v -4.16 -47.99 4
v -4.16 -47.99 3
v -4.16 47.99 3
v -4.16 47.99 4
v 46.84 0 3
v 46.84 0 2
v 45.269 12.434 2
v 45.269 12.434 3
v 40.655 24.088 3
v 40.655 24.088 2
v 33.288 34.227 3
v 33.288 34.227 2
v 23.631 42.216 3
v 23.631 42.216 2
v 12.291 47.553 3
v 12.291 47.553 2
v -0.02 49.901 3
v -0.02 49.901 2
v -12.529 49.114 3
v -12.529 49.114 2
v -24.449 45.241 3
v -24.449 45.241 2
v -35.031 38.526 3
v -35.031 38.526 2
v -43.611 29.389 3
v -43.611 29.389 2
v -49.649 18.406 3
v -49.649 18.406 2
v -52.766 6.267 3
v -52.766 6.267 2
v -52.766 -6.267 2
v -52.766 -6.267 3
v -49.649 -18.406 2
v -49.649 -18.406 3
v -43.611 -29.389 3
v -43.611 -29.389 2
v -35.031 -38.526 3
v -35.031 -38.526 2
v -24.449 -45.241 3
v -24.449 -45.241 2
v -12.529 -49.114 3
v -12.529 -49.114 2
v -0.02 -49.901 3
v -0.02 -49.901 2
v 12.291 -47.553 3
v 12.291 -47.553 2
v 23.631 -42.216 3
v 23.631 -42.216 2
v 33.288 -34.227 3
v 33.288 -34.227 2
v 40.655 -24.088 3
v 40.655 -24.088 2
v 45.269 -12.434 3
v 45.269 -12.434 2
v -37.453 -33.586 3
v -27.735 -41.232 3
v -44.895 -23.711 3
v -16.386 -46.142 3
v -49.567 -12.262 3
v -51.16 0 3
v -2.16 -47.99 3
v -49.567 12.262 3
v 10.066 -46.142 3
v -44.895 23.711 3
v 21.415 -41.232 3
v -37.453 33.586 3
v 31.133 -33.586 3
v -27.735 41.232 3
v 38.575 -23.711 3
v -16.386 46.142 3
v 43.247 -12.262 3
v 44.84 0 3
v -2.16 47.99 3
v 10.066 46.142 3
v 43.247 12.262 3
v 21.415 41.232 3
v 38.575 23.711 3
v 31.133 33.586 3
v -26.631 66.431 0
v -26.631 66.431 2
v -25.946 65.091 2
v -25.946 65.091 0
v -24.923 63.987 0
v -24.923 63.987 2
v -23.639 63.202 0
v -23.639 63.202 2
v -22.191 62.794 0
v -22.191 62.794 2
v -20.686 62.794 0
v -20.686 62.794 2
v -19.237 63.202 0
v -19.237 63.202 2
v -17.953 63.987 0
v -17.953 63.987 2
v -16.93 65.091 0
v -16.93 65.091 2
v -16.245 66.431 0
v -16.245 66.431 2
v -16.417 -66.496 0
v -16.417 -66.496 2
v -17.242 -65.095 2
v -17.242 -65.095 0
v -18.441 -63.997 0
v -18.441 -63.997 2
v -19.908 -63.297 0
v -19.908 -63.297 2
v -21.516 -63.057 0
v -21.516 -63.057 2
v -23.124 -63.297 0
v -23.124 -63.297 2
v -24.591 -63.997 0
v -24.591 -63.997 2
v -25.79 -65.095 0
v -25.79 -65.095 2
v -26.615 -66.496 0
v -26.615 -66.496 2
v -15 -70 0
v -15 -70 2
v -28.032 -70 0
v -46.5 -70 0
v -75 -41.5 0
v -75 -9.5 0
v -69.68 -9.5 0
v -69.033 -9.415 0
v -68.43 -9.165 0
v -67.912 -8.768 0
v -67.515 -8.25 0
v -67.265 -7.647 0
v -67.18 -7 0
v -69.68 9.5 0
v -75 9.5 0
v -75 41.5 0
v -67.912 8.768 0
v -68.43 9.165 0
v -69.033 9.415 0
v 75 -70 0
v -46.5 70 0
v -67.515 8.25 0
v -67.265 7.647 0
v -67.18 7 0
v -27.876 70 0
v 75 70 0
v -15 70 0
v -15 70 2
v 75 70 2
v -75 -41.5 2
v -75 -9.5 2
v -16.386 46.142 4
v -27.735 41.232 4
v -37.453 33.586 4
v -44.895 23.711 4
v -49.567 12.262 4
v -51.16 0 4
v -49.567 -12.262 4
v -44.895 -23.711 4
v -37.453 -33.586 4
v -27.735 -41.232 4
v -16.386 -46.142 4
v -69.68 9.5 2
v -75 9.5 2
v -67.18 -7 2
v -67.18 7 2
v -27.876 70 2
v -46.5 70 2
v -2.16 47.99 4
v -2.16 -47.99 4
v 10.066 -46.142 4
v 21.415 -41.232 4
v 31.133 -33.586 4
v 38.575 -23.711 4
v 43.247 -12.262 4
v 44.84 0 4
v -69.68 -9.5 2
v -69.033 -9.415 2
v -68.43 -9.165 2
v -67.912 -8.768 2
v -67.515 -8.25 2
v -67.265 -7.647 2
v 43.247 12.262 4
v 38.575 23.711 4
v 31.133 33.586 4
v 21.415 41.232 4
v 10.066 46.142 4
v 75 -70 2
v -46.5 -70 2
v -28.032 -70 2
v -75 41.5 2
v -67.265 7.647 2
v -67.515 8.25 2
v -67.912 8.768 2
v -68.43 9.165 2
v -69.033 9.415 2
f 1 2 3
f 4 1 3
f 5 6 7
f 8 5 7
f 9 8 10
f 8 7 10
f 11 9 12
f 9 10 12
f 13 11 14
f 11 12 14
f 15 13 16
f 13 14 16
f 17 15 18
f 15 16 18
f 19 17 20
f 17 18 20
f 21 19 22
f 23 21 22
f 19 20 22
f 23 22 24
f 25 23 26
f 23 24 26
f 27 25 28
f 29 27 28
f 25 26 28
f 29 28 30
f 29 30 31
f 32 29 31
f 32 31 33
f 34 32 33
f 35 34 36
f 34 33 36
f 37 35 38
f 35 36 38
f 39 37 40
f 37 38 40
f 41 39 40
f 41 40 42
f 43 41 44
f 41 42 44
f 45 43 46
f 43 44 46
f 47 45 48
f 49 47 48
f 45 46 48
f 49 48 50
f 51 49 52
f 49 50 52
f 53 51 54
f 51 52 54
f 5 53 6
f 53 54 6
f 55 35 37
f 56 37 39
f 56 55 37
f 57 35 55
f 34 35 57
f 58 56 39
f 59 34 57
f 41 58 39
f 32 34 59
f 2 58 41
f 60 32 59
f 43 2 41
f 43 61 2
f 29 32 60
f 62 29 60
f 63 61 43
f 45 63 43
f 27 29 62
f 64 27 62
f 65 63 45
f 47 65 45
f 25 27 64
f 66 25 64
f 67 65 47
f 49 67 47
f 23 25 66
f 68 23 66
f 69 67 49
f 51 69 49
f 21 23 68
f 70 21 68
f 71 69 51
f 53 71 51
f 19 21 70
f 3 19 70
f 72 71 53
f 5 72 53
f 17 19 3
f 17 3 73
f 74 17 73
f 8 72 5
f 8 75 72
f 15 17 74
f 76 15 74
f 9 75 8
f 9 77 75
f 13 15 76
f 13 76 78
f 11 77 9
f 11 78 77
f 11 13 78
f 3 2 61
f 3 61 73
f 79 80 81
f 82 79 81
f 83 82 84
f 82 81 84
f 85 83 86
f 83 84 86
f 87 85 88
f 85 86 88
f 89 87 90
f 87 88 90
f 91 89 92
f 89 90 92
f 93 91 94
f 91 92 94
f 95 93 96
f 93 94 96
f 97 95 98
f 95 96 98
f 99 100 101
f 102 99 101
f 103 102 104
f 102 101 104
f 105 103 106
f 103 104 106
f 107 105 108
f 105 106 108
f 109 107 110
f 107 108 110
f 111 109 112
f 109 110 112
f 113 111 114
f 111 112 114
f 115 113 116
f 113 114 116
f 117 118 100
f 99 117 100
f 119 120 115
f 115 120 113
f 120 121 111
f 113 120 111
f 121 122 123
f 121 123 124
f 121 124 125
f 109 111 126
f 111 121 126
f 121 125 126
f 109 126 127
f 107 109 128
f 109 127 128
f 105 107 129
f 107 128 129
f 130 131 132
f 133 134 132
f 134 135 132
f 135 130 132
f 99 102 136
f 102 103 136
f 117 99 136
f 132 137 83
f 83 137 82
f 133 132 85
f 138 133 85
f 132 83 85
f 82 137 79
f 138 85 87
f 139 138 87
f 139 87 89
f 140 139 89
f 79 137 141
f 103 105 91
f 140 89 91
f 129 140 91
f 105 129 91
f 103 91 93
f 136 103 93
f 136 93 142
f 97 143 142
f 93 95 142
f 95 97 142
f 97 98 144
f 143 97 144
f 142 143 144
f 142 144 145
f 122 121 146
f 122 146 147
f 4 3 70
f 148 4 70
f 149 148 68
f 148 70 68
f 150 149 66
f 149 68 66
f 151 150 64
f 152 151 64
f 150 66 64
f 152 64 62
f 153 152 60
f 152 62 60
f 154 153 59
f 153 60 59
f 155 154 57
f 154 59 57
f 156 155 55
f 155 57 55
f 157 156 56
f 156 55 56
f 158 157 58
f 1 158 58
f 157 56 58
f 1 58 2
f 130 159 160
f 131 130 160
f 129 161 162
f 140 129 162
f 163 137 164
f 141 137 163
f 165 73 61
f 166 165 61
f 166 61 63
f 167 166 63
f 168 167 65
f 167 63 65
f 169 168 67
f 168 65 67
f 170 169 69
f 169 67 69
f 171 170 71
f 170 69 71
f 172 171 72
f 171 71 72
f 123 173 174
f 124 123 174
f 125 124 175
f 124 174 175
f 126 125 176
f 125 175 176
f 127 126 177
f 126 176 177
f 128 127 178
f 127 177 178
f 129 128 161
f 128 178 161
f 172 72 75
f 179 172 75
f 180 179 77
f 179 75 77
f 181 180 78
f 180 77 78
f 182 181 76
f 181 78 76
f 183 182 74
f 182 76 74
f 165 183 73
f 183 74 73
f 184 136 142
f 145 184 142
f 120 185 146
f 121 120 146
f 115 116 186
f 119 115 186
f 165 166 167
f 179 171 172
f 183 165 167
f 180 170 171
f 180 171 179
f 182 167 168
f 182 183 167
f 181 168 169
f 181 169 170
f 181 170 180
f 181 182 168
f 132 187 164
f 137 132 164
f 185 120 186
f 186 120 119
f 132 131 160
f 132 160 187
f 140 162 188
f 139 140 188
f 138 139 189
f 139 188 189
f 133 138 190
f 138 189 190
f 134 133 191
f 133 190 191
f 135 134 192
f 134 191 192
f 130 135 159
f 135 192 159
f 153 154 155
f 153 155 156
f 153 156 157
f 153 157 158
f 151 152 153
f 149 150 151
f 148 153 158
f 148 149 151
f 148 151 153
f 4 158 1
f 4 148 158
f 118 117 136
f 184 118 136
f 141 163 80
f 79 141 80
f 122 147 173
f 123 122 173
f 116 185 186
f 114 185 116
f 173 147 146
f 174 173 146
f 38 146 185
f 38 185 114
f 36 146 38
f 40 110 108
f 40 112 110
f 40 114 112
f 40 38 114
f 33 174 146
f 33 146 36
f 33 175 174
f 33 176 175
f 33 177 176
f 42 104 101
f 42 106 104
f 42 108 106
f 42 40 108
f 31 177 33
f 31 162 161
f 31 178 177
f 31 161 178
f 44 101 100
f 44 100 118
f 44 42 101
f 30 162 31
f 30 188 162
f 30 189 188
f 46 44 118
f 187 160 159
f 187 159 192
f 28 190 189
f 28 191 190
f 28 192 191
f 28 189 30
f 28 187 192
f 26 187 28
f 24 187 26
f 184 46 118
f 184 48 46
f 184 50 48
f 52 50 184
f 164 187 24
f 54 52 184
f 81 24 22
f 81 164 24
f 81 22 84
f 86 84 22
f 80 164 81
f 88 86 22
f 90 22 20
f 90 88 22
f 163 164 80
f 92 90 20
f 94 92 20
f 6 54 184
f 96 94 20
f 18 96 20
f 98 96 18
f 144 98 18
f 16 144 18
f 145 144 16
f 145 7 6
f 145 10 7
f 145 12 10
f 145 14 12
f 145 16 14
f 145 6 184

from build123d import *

# Parameters (mm, degrees)
F0_W      = 150
F0_H      = 140
F1_DEPTH  = 2
F3_DEPTH  = 2.001
F5_DEPTH  = 2.001
F7_DEPTH  = 2.001
F8_R      = 50
F9_DEPTH  = 1
F11_DEPTH = 1


with BuildPart() as f1:
    # F0 (on Top) → F1 (new body)
    with BuildSketch(Plane.XY):
        Rectangle(F0_W, F0_H)
    extrude(amount=F1_DEPTH)

    # F2 (on face) → F3 (cut, through all)
    with BuildSketch(Plane.XY.offset(2)):
        Polygon((-75, 70), (-75, 41.5), (-46.5, 70), align=None)
        Polygon((-46.5, -70), (-75, -41.5), (-75, -70), align=None)
    extrude(amount=-F3_DEPTH, mode=Mode.SUBTRACT)

    # F4 (on face) → F5 (cut, through all)
    with BuildSketch(Plane.XY.offset(2)):
        with BuildLine():
            Line((-69.68, 9.5), (-75, 9.5))
            Line((-75, 9.5), (-75, -9.5))
            Line((-75, -9.5), (-69.68, -9.5))
            ThreePointArc((-69.68, -9.5), (-67.912233, -8.767767), (-67.18, -7))
            Line((-67.18, -7), (-67.18, 7))
            ThreePointArc((-67.18, 7), (-67.912233, 8.767767), (-69.68, 9.5))
        make_face()
    extrude(amount=-F5_DEPTH, mode=Mode.SUBTRACT)

    # F6 (on face) → F7 (cut, through all)
    with BuildSketch(Plane.XY.offset(2)):
        with BuildLine():
            Line((-28.031671, -70), (-15, -70))
            Line((-15, -70), (-16.416769, -66.495551))
            ThreePointArc((-16.416769, -66.495551), (-21.515836, -63.056988), (-26.614902, -66.495551))
            Line((-26.614902, -66.495551), (-28.031671, -70))
        make_face()
        with BuildLine():
            Line((-27.876137, 70), (-26.631231, 66.430881))
            ThreePointArc((-26.631231, 66.430881), (-21.438069, 62.742254), (-16.244907, 66.430881))
            Line((-16.244907, 66.430881), (-15, 70))
            Line((-15, 70), (-27.876137, 70))
        make_face()
    extrude(amount=-F7_DEPTH, mode=Mode.SUBTRACT)

    # F8 (on face) → F9 (join)
    with BuildSketch(Plane.XY.offset(2)):
        with Locations((-3.16, 0)):
            Circle(F8_R)
    extrude(amount=F9_DEPTH)

    # F10 (on face) → F11 (join)
    with BuildSketch(Plane.XY.offset(3)):
        with BuildLine():
            ThreePointArc((-2.16, -47.989582), (31.132856, -33.585711), (44.84, 0))
            ThreePointArc((44.84, 0), (31.132856, 33.585711), (-2.16, 47.989582))
            Line((-2.16, 47.989582), (-2.16, -47.989582))
        make_face()
        with BuildLine():
            Line((-4.16, -47.989582), (-4.16, 47.989582))
            ThreePointArc((-4.16, 47.989582), (-51.16, 0), (-4.16, -47.989582))
        make_face()
    extrude(amount=F11_DEPTH)


solid = f1.part
